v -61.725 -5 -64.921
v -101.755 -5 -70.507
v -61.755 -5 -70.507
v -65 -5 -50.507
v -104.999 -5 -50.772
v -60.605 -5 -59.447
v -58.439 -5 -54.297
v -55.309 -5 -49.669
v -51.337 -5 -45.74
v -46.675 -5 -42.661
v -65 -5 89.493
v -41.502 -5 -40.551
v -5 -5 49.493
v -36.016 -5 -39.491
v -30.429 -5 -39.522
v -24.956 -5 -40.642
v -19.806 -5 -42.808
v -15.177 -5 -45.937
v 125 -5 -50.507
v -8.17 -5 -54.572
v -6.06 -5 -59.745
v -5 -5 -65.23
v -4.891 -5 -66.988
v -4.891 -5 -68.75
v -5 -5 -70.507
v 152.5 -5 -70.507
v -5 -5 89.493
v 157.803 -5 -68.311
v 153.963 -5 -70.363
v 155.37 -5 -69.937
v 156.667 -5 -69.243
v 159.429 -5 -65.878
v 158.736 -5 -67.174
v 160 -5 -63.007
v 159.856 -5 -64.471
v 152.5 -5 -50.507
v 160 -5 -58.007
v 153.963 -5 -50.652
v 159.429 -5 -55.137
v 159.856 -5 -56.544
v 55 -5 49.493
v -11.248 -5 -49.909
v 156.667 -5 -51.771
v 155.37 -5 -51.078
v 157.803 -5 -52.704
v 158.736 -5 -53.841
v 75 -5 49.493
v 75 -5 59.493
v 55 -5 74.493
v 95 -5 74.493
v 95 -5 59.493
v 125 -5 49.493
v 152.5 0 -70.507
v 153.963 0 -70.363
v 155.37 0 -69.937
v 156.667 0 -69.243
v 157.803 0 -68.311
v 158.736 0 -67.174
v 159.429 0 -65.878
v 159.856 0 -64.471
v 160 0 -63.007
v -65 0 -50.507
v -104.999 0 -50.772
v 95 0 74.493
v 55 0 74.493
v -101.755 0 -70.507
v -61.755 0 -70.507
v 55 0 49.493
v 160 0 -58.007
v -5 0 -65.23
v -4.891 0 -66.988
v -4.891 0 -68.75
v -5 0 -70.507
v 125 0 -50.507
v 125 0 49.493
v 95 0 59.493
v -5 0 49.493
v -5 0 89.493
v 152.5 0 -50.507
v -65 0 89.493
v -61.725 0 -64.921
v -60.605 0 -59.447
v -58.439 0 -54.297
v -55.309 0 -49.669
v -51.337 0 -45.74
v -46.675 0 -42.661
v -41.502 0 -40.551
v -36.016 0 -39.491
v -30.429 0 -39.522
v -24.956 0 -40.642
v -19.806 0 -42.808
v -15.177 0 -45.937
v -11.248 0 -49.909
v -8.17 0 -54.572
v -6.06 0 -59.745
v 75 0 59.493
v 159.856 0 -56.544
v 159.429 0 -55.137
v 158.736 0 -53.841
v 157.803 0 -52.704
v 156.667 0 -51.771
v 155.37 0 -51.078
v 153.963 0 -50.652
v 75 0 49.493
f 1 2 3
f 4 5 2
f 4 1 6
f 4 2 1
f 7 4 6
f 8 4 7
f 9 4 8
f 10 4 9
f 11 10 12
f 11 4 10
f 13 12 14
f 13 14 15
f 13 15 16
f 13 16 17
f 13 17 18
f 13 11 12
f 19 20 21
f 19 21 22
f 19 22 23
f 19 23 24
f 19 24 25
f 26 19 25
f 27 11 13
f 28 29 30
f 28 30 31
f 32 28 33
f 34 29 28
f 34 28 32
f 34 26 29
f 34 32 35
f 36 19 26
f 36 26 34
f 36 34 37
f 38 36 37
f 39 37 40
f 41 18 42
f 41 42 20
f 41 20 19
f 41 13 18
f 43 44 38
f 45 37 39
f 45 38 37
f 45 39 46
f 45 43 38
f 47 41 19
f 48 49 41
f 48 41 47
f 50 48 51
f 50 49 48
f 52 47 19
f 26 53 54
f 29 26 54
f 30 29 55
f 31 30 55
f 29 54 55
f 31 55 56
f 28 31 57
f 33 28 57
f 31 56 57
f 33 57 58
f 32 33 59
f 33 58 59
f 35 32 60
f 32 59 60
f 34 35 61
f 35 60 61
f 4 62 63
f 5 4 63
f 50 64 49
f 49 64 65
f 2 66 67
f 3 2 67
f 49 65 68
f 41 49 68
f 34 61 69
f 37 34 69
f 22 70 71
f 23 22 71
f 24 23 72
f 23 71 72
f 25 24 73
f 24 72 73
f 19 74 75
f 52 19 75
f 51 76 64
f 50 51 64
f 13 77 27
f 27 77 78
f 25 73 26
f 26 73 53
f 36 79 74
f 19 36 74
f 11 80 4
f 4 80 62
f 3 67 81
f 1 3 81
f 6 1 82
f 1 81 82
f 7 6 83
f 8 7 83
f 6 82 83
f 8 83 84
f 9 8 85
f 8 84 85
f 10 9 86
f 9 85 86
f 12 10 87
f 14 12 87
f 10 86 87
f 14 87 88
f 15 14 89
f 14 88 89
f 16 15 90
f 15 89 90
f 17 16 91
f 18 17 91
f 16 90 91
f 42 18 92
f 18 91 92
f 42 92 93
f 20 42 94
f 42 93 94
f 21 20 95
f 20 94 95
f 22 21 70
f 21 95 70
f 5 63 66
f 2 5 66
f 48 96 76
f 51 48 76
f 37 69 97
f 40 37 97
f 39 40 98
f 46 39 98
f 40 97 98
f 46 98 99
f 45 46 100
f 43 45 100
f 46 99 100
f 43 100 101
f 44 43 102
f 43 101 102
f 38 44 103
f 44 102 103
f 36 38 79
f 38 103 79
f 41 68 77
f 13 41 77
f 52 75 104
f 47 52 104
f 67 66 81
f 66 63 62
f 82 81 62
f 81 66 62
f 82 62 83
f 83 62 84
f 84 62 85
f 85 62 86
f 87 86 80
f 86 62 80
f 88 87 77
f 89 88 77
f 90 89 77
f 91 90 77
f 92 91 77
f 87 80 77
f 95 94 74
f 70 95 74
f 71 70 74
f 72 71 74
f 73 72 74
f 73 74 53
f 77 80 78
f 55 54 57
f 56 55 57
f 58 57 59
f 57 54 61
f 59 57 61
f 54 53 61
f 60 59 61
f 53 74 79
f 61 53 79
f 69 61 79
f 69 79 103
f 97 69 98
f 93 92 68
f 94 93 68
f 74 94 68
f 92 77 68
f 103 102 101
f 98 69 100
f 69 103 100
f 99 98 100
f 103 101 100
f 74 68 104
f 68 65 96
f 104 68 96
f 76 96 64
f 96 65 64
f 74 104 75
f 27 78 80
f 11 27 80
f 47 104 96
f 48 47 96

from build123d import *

# Parameters (mm, degrees)
F1_DEPTH = 5


with BuildPart() as f1:
    # F0 (on Front) → F1 (new body)
    with BuildSketch(Plane.XZ):
        with BuildLine():
            Line((-5, 89.492543), (-65, 89.492543))
            Line((-65, 89.492543), (-65, -50.507457))
            Line((-65, -50.507457), (-104.999123, -50.772287))
            Line((-104.999123, -50.772287), (-101.755198, -70.507457))
            Line((-101.755198, -70.507457), (-61.755198, -70.507457))
            ThreePointArc((-61.755198, -70.507457), (-36.016138, -39.49132), (-5, -65.23038))
            ThreePointArc((-5, -65.23038), (-4.877599, -67.868918), (-5, -70.507457))
            Line((-5, -70.507457), (125, -70.507457))
            Line((125, -70.507457), (152.5, -70.507457))
            ThreePointArc((152.5, -70.507457), (157.803301, -68.310758), (160, -63.007457))
            Line((160, -63.007457), (160, -58.007457))
            ThreePointArc((160, -58.007457), (157.803301, -52.704156), (152.5, -50.507457))
            Line((152.5, -50.507457), (125, -50.507457))
            Line((125, -50.507457), (125, -2.5))
            Line((125, -2.5), (125, 0))
            Line((125, 0), (125, 49.492543))
            Line((125, 49.492543), (75, 49.492543))
            Line((75, 49.492543), (75, 59.492543))
            Line((75, 59.492543), (95, 59.492543))
            Line((95, 59.492543), (95, 74.492543))
            Line((95, 74.492543), (55, 74.492543))
            Line((55, 74.492543), (55, 49.492543))
            Line((55, 49.492543), (-5, 49.492543))
            Line((-5, 49.492543), (-5, 89.492543))
        make_face()
    extrude(amount=F1_DEPTH)


solid = f1.part
